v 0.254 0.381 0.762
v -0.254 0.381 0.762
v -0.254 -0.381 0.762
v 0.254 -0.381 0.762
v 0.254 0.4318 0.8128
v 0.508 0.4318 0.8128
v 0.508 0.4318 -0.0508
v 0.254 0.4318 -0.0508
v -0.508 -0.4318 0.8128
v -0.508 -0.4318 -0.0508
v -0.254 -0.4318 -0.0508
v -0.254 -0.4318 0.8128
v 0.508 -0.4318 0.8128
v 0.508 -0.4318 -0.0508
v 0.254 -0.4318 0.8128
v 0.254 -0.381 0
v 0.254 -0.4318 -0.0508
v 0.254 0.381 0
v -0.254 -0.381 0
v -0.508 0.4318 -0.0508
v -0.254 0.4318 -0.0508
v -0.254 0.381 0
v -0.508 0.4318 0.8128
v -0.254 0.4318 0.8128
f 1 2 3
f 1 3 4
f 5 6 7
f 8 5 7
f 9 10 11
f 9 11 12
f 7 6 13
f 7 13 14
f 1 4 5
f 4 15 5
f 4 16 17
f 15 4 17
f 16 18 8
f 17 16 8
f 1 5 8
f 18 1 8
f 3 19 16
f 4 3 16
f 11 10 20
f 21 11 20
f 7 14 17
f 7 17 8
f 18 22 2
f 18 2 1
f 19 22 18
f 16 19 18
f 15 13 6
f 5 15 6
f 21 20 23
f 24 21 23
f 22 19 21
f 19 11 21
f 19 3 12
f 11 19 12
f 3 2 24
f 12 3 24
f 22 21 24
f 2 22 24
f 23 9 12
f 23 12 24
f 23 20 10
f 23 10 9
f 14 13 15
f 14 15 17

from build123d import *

# Parameters (mm, degrees)
CHIP_W              = 1.016
CHIP_H              = 0.762
CHIP_CAP_DEPTH      = 0.762
SOLDER_BAND_W       = 0.8636
SOLDER_BAND_H       = 0.8636
SOLDER_BAND_R_DEPTH = 0.254
SKETCH3_W           = 0.8636
SKETCH3_H           = 0.8636
SOLDER_BAND_L_DEPTH = 0.254


with BuildPart() as part:
    # Chip → Chip Cap (new body)
    with BuildSketch(Plane.XY):
        Rectangle(CHIP_W, CHIP_H)
    extrude(amount=CHIP_CAP_DEPTH)

    # Solder Band → Solder Band R (add)
    with BuildSketch(Plane(origin=(0.508, 0, 0), x_dir=(0, 0, -1), z_dir=(1, 0, 0))):
        with Locations((-0.381, 0)):
            Rectangle(SOLDER_BAND_W, SOLDER_BAND_H)
    extrude(amount=-SOLDER_BAND_R_DEPTH)

    # Sketch3 → Solder Band L (add)
    with BuildSketch(Plane.ZY.offset(0.508)):
        with Locations((0.381, 0)):
            Rectangle(SKETCH3_W, SKETCH3_H)
    extrude(amount=-SOLDER_BAND_L_DEPTH)


solid = part.part
